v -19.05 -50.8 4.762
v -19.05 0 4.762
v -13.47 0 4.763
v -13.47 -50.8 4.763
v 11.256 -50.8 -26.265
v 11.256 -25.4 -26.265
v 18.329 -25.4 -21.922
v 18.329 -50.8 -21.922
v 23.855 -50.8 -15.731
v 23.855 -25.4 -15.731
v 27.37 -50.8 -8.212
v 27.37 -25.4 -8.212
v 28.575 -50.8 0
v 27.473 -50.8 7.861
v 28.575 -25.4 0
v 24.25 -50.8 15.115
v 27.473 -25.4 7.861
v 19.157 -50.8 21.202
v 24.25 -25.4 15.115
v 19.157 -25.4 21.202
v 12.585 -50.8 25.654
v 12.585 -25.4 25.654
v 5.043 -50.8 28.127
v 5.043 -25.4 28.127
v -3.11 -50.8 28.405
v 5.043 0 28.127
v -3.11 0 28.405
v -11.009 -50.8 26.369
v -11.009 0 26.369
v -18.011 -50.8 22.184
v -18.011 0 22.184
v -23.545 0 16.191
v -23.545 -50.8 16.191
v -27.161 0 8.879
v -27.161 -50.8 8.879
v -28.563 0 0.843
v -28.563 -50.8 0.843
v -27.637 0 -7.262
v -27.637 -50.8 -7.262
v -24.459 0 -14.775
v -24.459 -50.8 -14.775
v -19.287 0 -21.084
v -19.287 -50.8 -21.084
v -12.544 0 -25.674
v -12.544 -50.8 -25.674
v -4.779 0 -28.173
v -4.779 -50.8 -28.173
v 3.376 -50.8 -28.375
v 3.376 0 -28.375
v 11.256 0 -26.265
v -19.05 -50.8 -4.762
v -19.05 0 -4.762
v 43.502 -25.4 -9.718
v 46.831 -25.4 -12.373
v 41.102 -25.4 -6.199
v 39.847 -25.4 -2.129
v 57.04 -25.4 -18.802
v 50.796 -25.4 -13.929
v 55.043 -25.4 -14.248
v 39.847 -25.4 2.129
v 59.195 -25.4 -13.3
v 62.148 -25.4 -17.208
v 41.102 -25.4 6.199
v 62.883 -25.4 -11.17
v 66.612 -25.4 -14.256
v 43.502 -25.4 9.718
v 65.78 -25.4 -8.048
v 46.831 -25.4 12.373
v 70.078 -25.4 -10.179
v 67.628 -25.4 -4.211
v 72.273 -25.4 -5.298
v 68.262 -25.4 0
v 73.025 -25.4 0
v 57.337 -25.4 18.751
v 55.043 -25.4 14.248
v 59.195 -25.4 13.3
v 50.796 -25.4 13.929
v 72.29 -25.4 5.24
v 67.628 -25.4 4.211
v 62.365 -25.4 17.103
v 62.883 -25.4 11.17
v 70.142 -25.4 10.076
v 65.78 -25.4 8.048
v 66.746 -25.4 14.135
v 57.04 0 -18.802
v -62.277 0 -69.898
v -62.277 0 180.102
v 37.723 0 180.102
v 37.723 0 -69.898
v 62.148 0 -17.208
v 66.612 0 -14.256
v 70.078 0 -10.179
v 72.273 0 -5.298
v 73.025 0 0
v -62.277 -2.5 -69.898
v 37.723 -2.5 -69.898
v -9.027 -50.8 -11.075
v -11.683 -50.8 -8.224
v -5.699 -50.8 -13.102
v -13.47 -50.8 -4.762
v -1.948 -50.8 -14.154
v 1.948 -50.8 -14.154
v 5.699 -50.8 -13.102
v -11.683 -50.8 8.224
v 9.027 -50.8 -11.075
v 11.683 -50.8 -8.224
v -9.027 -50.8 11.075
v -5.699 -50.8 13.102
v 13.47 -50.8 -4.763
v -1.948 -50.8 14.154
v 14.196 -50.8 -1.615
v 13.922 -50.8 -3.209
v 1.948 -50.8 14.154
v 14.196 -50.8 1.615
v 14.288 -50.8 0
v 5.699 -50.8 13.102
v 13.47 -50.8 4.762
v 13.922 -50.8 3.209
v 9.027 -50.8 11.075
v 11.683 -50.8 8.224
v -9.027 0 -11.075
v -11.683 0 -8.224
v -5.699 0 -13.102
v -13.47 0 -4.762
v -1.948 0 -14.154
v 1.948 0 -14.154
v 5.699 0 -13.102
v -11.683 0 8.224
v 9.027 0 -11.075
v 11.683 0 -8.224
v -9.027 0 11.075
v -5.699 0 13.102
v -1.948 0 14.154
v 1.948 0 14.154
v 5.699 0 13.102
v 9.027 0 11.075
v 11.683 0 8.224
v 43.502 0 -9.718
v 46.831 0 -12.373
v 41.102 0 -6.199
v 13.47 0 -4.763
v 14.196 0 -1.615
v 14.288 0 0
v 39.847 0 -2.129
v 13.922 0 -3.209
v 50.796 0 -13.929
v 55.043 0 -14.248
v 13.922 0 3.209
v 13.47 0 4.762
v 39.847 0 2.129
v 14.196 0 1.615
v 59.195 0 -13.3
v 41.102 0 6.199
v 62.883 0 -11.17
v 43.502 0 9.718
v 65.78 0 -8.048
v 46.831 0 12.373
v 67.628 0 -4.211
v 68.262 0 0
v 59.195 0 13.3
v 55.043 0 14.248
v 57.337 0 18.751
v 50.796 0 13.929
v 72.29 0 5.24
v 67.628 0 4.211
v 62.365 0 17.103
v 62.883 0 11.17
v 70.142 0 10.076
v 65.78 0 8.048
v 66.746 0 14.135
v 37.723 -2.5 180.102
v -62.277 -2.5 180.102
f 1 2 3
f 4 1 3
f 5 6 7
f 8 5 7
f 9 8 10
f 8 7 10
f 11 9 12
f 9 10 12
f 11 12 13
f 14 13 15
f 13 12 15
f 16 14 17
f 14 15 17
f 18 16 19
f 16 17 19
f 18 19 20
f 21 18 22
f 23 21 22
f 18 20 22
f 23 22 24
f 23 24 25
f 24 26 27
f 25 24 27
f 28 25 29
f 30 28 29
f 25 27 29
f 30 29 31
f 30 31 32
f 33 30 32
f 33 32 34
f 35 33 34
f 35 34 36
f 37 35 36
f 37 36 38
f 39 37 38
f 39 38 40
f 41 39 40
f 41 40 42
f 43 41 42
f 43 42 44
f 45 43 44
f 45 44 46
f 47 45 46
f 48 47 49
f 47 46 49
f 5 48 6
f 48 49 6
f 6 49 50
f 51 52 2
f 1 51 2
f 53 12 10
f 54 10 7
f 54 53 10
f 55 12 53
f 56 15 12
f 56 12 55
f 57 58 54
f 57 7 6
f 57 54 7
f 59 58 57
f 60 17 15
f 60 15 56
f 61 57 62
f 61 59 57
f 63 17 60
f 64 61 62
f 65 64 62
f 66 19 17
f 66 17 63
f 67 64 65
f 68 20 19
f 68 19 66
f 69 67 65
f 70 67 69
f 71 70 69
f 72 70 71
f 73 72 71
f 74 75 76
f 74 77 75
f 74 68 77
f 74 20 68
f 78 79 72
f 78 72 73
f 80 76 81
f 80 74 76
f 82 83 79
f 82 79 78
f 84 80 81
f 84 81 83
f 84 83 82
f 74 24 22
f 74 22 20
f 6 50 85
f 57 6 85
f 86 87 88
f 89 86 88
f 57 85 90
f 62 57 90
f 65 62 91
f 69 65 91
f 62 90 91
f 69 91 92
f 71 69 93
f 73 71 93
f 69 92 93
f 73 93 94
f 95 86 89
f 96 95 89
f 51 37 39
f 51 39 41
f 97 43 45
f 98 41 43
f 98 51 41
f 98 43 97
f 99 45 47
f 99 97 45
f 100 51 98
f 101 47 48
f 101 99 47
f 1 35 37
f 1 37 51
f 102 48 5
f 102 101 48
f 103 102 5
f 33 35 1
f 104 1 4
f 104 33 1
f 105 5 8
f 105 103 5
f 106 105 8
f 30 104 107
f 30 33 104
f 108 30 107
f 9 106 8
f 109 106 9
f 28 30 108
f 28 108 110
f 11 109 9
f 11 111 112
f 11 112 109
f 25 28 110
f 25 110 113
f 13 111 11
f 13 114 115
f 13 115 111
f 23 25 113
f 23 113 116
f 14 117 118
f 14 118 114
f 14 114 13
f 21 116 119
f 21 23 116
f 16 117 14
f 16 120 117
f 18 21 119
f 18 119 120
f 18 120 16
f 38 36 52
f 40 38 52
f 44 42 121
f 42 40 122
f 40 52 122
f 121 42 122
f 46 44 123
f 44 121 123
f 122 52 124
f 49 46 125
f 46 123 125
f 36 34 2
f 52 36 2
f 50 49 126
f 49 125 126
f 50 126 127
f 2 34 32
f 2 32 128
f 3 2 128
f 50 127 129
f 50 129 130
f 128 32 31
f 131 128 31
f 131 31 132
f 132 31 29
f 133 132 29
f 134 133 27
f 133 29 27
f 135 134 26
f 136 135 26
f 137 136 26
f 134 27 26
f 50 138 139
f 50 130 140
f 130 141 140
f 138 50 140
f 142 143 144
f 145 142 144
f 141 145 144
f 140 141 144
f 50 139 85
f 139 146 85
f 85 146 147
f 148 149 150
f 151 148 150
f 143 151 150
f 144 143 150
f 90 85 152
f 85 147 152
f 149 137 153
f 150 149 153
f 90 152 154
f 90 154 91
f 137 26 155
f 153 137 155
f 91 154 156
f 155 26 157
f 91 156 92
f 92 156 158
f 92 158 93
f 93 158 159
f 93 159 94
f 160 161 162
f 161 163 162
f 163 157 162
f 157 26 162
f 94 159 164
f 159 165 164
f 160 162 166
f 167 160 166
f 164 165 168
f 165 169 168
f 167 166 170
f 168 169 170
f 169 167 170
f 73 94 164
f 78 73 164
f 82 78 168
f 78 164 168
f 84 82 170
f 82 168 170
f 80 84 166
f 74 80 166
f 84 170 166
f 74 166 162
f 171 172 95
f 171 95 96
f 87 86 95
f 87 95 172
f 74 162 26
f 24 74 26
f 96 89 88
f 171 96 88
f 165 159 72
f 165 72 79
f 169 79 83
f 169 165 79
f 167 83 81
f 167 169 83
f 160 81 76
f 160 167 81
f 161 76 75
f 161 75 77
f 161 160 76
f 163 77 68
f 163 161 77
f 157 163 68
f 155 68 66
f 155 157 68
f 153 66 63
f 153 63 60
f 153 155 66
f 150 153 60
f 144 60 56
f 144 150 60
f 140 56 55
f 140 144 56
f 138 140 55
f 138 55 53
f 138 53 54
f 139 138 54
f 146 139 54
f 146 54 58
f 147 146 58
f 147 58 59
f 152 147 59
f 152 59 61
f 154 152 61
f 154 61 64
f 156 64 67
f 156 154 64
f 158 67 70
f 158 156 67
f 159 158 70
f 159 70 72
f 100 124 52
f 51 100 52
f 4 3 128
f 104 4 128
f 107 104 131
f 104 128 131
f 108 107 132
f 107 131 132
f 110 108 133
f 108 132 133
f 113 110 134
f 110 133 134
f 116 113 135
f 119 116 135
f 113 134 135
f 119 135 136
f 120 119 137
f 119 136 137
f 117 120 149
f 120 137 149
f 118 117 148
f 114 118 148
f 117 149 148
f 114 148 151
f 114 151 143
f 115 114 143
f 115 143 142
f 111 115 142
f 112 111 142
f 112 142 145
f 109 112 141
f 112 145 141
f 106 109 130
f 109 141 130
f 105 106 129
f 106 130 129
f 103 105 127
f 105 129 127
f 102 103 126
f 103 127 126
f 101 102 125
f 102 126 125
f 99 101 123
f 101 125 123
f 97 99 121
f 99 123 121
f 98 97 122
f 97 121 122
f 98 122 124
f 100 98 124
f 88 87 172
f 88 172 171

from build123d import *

# Parameters (mm, degrees)
F0_R     = 14.2875
F1_DEPTH = 25.4
F2_DEPTH = 50.8
F3_W     = 100
F3_H     = 250
F4_DEPTH = 2.5


# Not quite as in the source:
# - a feature of the source that left no trace in its solid (it failed there, or was rolled back) is left out


with BuildPart() as f1:
    # F0 (on Front) → F1 (new body)
    with BuildSketch(Plane.XZ):
        with BuildLine():
            ThreePointArc((11.2557435726, -26.2647836775), (23.8554343661, -15.7305078178), (28.575, 0))
            ThreePointArc((28.575, 0), (21.9160245563, 18.3362616868), (5.0426470588, 28.1265414802))
            ThreePointArc((5.0426470588, 28.1265414802), (-28.3903759644, -3.2430198275), (11.2557435726, -26.2647836775))
        make_face()
        with BuildLine():
            ThreePointArc((-13.4703841816, 4.7625), (0, 14.2875), (13.4703841816, 4.7625))
            Line((13.4703841816, 4.7625), (19.05, 4.7625))
            Line((19.05, 4.7625), (19.05, -4.7625))
            Line((19.05, -4.7625), (13.4703841816, -4.7625))
            ThreePointArc((13.4703841816, -4.7625), (0, -14.2875), (-13.4703841816, -4.7625))
            Line((-13.4703841816, -4.7625), (-19.05, -4.7625))
            Line((-19.05, -4.7625), (-19.05, 4.7625))
            Line((-19.05, 4.7625), (-13.4703841816, 4.7625))
        make_face(mode=Mode.SUBTRACT)
        with BuildLine():
            ThreePointArc((5.0426470588, 28.1265414802), (21.9160245563, 18.3362616868), (28.575, 0))
            ThreePointArc((28.575, 0), (23.8554343661, -15.7305078178), (11.2557435726, -26.2647836775))
            Line((11.2557435726, -26.2647836775), (57.0397573458, -18.8018552917))
            ThreePointArc((57.0397573458, -18.8018552917), (34.925595789, 0.1506625541), (57.3367647059, 18.7510276535))
            Line((57.3367647059, 18.7510276535), (5.0426470588, 28.1265414802))
        make_face()
        with BuildLine():
            ThreePointArc((73.025, 0), (68.5856830375, 12.2241744579), (57.3367647059, 18.7510276535))
            ThreePointArc((57.3367647059, 18.7510276535), (34.925595789, 0.1506625541), (57.0397573458, -18.8018552917))
            ThreePointArc((57.0397573458, -18.8018552917), (68.4885475925, -12.3393450508), (73.025, 0))
        make_face()
        with Locations((53.975, 0)):
            Circle(F0_R, mode=Mode.SUBTRACT)
    extrude(amount=F1_DEPTH)

    # F0 (on Front) → F2 (join)
    with BuildSketch(Plane.XZ):
        with BuildLine():
            ThreePointArc((11.2557435726, -26.2647836775), (23.8554343661, -15.7305078178), (28.575, 0))
            ThreePointArc((28.575, 0), (21.9160245563, 18.3362616868), (5.0426470588, 28.1265414802))
            ThreePointArc((5.0426470588, 28.1265414802), (-28.3903759644, -3.2430198275), (11.2557435726, -26.2647836775))
        make_face()
        with BuildLine():
            ThreePointArc((-13.4703841816, 4.7625), (0, 14.2875), (13.4703841816, 4.7625))
            Line((13.4703841816, 4.7625), (19.05, 4.7625))
            Line((19.05, 4.7625), (19.05, -4.7625))
            Line((19.05, -4.7625), (13.4703841816, -4.7625))
            ThreePointArc((13.4703841816, -4.7625), (0, -14.2875), (-13.4703841816, -4.7625))
            Line((-13.4703841816, -4.7625), (-19.05, -4.7625))
            Line((-19.05, -4.7625), (-19.05, 4.7625))
            Line((-19.05, 4.7625), (-13.4703841816, 4.7625))
        make_face(mode=Mode.SUBTRACT)
        with BuildLine():
            ThreePointArc((13.4703841816, 4.7625), (14.081739421, 2.416044521), (14.2875, 0))
            ThreePointArc((14.2875, 0), (14.081739421, -2.416044521), (13.4703841816, -4.7625))
            Line((13.4703841816, -4.7625), (19.05, -4.7625))
            Line((19.05, -4.7625), (19.05, 4.7625))
            Line((19.05, 4.7625), (13.4703841816, 4.7625))
        make_face()
    extrude(amount=F2_DEPTH)


with BuildPart() as f4:
    # F3 (on Front) → F4 (new body)
    with BuildSketch(Plane.XZ):
        with Locations((-12.2774355114, 55.1020845771)):
            Rectangle(F3_W, F3_H)
    extrude(amount=F4_DEPTH)


solid = Compound([f1.part, f4.part])
